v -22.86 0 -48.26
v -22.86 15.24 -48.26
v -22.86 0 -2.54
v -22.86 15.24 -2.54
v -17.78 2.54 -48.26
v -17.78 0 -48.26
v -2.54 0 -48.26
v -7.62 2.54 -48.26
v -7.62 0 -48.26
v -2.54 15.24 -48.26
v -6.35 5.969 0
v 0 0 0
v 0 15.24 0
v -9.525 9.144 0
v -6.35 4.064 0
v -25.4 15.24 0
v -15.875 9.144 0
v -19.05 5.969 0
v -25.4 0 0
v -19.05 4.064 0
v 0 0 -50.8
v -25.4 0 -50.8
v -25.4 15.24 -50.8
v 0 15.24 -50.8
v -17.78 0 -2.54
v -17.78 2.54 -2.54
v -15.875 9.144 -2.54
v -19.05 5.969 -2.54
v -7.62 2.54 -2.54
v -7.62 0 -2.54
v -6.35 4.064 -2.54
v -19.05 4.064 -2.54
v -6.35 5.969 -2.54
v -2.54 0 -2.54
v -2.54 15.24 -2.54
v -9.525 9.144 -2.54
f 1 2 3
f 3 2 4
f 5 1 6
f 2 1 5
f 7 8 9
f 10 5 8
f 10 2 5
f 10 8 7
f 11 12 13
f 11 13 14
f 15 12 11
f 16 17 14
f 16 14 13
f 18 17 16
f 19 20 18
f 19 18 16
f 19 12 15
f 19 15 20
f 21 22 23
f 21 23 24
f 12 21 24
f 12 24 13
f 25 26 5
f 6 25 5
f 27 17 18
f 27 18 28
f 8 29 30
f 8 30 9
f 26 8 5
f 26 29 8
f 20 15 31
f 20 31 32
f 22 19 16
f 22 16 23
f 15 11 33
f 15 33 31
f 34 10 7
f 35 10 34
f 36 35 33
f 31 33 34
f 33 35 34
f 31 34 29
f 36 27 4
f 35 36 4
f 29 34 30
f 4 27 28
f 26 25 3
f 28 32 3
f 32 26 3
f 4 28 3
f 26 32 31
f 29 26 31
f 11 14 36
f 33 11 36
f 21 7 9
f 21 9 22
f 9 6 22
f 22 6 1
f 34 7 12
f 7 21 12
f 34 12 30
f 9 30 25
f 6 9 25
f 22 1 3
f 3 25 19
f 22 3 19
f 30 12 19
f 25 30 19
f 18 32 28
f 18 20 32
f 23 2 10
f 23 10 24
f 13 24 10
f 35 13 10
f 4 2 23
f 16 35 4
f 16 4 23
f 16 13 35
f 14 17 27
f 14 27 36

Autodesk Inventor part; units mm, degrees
ref_plane "YZ Plane" through (0, 0, 0) normal (1, 0, 0) x (0, 1, 0)
ref_plane "XZ Plane" through (0, 0, 0) normal (0, 1, 0) x (-1, 0, 0)
ref_plane "XY Plane" through (0, 0, 0) normal (0, 0, 1) x (1, 0, 0)
sketch "Sketch1" plane through (0, 0, 0) normal (0, 1, 0) x (-1, 0, 0)
  line L0 (0, 0) -> (25.4, 0)
  line L1 (25.4, 0) -> (25.4, -50.8)
  line L2 (25.4, -50.8) -> (0, -50.8)
  line L3 (0, -50.8) -> (0, 0)
  dimension "d0" = 25.4
  dimension "d1" = 50.8
extrude "Extrusion1" add sketch "Sketch1" along normal blind 15.24
shell "Shell1" thickness 2.54 removed faces 1 at (-8.4667, 15.24, -33.8667)
sketch "Sketch3" plane through (-25.4, 0, 0) normal (0, 0, 1) x (1, 0, 0)
  line L0 (19.05, 4.064) -> (6.35, 4.064)
  line L1 (6.35, 4.064) -> (6.35, 9.144)
  line L2 (6.35, 9.144) -> (19.05, 9.144)
  line L3 (19.05, 9.144) -> (19.05, 4.064)
  point P0 (25.4, 0)
  dimension "d20" = 4.064
  dimension "d21" = 12.7
  dimension "d22" = 5.08
  dimension "d23" = 6.35
extrude "Extrusion3" cut sketch "Sketch3" against normal blind 2.54
chamfer "Chamfer1" distance 3.175 angle 45 2 edges at (-19.05, 9.144, -1.27) (-6.35, 9.144, -1.27)
sketch "Sketch5" plane through (-22.86, 2.54, -2.54) normal (0, 1, 0) x (1, 0, 0)
  line L0 (0, 0) -> (5.08, 0)
  line L1 (5.08, 0) -> (5.08, 45.72)
  line L2 (5.08, 45.72) -> (0, 45.72)
  line L3 (0, 45.72) -> (0, 0)
  line L4 (0, 45.72) -> (20.32, 45.72) projected
  line L5 (20.32, 0) -> (15.24, 0)
  line L6 (15.24, 0) -> (15.24, 45.72)
  line L7 (15.24, 45.72) -> (20.32, 45.72)
  line L8 (20.32, 45.72) -> (20.32, 0)
  point P0 (22.86, -2.54)
  dimension "d29" = 5.08
  dimension "d30" = 5.08
extrude "Extrusion4" cut sketch "Sketch5" against normal blind 2.54
properties part number "nano_enclosure"
